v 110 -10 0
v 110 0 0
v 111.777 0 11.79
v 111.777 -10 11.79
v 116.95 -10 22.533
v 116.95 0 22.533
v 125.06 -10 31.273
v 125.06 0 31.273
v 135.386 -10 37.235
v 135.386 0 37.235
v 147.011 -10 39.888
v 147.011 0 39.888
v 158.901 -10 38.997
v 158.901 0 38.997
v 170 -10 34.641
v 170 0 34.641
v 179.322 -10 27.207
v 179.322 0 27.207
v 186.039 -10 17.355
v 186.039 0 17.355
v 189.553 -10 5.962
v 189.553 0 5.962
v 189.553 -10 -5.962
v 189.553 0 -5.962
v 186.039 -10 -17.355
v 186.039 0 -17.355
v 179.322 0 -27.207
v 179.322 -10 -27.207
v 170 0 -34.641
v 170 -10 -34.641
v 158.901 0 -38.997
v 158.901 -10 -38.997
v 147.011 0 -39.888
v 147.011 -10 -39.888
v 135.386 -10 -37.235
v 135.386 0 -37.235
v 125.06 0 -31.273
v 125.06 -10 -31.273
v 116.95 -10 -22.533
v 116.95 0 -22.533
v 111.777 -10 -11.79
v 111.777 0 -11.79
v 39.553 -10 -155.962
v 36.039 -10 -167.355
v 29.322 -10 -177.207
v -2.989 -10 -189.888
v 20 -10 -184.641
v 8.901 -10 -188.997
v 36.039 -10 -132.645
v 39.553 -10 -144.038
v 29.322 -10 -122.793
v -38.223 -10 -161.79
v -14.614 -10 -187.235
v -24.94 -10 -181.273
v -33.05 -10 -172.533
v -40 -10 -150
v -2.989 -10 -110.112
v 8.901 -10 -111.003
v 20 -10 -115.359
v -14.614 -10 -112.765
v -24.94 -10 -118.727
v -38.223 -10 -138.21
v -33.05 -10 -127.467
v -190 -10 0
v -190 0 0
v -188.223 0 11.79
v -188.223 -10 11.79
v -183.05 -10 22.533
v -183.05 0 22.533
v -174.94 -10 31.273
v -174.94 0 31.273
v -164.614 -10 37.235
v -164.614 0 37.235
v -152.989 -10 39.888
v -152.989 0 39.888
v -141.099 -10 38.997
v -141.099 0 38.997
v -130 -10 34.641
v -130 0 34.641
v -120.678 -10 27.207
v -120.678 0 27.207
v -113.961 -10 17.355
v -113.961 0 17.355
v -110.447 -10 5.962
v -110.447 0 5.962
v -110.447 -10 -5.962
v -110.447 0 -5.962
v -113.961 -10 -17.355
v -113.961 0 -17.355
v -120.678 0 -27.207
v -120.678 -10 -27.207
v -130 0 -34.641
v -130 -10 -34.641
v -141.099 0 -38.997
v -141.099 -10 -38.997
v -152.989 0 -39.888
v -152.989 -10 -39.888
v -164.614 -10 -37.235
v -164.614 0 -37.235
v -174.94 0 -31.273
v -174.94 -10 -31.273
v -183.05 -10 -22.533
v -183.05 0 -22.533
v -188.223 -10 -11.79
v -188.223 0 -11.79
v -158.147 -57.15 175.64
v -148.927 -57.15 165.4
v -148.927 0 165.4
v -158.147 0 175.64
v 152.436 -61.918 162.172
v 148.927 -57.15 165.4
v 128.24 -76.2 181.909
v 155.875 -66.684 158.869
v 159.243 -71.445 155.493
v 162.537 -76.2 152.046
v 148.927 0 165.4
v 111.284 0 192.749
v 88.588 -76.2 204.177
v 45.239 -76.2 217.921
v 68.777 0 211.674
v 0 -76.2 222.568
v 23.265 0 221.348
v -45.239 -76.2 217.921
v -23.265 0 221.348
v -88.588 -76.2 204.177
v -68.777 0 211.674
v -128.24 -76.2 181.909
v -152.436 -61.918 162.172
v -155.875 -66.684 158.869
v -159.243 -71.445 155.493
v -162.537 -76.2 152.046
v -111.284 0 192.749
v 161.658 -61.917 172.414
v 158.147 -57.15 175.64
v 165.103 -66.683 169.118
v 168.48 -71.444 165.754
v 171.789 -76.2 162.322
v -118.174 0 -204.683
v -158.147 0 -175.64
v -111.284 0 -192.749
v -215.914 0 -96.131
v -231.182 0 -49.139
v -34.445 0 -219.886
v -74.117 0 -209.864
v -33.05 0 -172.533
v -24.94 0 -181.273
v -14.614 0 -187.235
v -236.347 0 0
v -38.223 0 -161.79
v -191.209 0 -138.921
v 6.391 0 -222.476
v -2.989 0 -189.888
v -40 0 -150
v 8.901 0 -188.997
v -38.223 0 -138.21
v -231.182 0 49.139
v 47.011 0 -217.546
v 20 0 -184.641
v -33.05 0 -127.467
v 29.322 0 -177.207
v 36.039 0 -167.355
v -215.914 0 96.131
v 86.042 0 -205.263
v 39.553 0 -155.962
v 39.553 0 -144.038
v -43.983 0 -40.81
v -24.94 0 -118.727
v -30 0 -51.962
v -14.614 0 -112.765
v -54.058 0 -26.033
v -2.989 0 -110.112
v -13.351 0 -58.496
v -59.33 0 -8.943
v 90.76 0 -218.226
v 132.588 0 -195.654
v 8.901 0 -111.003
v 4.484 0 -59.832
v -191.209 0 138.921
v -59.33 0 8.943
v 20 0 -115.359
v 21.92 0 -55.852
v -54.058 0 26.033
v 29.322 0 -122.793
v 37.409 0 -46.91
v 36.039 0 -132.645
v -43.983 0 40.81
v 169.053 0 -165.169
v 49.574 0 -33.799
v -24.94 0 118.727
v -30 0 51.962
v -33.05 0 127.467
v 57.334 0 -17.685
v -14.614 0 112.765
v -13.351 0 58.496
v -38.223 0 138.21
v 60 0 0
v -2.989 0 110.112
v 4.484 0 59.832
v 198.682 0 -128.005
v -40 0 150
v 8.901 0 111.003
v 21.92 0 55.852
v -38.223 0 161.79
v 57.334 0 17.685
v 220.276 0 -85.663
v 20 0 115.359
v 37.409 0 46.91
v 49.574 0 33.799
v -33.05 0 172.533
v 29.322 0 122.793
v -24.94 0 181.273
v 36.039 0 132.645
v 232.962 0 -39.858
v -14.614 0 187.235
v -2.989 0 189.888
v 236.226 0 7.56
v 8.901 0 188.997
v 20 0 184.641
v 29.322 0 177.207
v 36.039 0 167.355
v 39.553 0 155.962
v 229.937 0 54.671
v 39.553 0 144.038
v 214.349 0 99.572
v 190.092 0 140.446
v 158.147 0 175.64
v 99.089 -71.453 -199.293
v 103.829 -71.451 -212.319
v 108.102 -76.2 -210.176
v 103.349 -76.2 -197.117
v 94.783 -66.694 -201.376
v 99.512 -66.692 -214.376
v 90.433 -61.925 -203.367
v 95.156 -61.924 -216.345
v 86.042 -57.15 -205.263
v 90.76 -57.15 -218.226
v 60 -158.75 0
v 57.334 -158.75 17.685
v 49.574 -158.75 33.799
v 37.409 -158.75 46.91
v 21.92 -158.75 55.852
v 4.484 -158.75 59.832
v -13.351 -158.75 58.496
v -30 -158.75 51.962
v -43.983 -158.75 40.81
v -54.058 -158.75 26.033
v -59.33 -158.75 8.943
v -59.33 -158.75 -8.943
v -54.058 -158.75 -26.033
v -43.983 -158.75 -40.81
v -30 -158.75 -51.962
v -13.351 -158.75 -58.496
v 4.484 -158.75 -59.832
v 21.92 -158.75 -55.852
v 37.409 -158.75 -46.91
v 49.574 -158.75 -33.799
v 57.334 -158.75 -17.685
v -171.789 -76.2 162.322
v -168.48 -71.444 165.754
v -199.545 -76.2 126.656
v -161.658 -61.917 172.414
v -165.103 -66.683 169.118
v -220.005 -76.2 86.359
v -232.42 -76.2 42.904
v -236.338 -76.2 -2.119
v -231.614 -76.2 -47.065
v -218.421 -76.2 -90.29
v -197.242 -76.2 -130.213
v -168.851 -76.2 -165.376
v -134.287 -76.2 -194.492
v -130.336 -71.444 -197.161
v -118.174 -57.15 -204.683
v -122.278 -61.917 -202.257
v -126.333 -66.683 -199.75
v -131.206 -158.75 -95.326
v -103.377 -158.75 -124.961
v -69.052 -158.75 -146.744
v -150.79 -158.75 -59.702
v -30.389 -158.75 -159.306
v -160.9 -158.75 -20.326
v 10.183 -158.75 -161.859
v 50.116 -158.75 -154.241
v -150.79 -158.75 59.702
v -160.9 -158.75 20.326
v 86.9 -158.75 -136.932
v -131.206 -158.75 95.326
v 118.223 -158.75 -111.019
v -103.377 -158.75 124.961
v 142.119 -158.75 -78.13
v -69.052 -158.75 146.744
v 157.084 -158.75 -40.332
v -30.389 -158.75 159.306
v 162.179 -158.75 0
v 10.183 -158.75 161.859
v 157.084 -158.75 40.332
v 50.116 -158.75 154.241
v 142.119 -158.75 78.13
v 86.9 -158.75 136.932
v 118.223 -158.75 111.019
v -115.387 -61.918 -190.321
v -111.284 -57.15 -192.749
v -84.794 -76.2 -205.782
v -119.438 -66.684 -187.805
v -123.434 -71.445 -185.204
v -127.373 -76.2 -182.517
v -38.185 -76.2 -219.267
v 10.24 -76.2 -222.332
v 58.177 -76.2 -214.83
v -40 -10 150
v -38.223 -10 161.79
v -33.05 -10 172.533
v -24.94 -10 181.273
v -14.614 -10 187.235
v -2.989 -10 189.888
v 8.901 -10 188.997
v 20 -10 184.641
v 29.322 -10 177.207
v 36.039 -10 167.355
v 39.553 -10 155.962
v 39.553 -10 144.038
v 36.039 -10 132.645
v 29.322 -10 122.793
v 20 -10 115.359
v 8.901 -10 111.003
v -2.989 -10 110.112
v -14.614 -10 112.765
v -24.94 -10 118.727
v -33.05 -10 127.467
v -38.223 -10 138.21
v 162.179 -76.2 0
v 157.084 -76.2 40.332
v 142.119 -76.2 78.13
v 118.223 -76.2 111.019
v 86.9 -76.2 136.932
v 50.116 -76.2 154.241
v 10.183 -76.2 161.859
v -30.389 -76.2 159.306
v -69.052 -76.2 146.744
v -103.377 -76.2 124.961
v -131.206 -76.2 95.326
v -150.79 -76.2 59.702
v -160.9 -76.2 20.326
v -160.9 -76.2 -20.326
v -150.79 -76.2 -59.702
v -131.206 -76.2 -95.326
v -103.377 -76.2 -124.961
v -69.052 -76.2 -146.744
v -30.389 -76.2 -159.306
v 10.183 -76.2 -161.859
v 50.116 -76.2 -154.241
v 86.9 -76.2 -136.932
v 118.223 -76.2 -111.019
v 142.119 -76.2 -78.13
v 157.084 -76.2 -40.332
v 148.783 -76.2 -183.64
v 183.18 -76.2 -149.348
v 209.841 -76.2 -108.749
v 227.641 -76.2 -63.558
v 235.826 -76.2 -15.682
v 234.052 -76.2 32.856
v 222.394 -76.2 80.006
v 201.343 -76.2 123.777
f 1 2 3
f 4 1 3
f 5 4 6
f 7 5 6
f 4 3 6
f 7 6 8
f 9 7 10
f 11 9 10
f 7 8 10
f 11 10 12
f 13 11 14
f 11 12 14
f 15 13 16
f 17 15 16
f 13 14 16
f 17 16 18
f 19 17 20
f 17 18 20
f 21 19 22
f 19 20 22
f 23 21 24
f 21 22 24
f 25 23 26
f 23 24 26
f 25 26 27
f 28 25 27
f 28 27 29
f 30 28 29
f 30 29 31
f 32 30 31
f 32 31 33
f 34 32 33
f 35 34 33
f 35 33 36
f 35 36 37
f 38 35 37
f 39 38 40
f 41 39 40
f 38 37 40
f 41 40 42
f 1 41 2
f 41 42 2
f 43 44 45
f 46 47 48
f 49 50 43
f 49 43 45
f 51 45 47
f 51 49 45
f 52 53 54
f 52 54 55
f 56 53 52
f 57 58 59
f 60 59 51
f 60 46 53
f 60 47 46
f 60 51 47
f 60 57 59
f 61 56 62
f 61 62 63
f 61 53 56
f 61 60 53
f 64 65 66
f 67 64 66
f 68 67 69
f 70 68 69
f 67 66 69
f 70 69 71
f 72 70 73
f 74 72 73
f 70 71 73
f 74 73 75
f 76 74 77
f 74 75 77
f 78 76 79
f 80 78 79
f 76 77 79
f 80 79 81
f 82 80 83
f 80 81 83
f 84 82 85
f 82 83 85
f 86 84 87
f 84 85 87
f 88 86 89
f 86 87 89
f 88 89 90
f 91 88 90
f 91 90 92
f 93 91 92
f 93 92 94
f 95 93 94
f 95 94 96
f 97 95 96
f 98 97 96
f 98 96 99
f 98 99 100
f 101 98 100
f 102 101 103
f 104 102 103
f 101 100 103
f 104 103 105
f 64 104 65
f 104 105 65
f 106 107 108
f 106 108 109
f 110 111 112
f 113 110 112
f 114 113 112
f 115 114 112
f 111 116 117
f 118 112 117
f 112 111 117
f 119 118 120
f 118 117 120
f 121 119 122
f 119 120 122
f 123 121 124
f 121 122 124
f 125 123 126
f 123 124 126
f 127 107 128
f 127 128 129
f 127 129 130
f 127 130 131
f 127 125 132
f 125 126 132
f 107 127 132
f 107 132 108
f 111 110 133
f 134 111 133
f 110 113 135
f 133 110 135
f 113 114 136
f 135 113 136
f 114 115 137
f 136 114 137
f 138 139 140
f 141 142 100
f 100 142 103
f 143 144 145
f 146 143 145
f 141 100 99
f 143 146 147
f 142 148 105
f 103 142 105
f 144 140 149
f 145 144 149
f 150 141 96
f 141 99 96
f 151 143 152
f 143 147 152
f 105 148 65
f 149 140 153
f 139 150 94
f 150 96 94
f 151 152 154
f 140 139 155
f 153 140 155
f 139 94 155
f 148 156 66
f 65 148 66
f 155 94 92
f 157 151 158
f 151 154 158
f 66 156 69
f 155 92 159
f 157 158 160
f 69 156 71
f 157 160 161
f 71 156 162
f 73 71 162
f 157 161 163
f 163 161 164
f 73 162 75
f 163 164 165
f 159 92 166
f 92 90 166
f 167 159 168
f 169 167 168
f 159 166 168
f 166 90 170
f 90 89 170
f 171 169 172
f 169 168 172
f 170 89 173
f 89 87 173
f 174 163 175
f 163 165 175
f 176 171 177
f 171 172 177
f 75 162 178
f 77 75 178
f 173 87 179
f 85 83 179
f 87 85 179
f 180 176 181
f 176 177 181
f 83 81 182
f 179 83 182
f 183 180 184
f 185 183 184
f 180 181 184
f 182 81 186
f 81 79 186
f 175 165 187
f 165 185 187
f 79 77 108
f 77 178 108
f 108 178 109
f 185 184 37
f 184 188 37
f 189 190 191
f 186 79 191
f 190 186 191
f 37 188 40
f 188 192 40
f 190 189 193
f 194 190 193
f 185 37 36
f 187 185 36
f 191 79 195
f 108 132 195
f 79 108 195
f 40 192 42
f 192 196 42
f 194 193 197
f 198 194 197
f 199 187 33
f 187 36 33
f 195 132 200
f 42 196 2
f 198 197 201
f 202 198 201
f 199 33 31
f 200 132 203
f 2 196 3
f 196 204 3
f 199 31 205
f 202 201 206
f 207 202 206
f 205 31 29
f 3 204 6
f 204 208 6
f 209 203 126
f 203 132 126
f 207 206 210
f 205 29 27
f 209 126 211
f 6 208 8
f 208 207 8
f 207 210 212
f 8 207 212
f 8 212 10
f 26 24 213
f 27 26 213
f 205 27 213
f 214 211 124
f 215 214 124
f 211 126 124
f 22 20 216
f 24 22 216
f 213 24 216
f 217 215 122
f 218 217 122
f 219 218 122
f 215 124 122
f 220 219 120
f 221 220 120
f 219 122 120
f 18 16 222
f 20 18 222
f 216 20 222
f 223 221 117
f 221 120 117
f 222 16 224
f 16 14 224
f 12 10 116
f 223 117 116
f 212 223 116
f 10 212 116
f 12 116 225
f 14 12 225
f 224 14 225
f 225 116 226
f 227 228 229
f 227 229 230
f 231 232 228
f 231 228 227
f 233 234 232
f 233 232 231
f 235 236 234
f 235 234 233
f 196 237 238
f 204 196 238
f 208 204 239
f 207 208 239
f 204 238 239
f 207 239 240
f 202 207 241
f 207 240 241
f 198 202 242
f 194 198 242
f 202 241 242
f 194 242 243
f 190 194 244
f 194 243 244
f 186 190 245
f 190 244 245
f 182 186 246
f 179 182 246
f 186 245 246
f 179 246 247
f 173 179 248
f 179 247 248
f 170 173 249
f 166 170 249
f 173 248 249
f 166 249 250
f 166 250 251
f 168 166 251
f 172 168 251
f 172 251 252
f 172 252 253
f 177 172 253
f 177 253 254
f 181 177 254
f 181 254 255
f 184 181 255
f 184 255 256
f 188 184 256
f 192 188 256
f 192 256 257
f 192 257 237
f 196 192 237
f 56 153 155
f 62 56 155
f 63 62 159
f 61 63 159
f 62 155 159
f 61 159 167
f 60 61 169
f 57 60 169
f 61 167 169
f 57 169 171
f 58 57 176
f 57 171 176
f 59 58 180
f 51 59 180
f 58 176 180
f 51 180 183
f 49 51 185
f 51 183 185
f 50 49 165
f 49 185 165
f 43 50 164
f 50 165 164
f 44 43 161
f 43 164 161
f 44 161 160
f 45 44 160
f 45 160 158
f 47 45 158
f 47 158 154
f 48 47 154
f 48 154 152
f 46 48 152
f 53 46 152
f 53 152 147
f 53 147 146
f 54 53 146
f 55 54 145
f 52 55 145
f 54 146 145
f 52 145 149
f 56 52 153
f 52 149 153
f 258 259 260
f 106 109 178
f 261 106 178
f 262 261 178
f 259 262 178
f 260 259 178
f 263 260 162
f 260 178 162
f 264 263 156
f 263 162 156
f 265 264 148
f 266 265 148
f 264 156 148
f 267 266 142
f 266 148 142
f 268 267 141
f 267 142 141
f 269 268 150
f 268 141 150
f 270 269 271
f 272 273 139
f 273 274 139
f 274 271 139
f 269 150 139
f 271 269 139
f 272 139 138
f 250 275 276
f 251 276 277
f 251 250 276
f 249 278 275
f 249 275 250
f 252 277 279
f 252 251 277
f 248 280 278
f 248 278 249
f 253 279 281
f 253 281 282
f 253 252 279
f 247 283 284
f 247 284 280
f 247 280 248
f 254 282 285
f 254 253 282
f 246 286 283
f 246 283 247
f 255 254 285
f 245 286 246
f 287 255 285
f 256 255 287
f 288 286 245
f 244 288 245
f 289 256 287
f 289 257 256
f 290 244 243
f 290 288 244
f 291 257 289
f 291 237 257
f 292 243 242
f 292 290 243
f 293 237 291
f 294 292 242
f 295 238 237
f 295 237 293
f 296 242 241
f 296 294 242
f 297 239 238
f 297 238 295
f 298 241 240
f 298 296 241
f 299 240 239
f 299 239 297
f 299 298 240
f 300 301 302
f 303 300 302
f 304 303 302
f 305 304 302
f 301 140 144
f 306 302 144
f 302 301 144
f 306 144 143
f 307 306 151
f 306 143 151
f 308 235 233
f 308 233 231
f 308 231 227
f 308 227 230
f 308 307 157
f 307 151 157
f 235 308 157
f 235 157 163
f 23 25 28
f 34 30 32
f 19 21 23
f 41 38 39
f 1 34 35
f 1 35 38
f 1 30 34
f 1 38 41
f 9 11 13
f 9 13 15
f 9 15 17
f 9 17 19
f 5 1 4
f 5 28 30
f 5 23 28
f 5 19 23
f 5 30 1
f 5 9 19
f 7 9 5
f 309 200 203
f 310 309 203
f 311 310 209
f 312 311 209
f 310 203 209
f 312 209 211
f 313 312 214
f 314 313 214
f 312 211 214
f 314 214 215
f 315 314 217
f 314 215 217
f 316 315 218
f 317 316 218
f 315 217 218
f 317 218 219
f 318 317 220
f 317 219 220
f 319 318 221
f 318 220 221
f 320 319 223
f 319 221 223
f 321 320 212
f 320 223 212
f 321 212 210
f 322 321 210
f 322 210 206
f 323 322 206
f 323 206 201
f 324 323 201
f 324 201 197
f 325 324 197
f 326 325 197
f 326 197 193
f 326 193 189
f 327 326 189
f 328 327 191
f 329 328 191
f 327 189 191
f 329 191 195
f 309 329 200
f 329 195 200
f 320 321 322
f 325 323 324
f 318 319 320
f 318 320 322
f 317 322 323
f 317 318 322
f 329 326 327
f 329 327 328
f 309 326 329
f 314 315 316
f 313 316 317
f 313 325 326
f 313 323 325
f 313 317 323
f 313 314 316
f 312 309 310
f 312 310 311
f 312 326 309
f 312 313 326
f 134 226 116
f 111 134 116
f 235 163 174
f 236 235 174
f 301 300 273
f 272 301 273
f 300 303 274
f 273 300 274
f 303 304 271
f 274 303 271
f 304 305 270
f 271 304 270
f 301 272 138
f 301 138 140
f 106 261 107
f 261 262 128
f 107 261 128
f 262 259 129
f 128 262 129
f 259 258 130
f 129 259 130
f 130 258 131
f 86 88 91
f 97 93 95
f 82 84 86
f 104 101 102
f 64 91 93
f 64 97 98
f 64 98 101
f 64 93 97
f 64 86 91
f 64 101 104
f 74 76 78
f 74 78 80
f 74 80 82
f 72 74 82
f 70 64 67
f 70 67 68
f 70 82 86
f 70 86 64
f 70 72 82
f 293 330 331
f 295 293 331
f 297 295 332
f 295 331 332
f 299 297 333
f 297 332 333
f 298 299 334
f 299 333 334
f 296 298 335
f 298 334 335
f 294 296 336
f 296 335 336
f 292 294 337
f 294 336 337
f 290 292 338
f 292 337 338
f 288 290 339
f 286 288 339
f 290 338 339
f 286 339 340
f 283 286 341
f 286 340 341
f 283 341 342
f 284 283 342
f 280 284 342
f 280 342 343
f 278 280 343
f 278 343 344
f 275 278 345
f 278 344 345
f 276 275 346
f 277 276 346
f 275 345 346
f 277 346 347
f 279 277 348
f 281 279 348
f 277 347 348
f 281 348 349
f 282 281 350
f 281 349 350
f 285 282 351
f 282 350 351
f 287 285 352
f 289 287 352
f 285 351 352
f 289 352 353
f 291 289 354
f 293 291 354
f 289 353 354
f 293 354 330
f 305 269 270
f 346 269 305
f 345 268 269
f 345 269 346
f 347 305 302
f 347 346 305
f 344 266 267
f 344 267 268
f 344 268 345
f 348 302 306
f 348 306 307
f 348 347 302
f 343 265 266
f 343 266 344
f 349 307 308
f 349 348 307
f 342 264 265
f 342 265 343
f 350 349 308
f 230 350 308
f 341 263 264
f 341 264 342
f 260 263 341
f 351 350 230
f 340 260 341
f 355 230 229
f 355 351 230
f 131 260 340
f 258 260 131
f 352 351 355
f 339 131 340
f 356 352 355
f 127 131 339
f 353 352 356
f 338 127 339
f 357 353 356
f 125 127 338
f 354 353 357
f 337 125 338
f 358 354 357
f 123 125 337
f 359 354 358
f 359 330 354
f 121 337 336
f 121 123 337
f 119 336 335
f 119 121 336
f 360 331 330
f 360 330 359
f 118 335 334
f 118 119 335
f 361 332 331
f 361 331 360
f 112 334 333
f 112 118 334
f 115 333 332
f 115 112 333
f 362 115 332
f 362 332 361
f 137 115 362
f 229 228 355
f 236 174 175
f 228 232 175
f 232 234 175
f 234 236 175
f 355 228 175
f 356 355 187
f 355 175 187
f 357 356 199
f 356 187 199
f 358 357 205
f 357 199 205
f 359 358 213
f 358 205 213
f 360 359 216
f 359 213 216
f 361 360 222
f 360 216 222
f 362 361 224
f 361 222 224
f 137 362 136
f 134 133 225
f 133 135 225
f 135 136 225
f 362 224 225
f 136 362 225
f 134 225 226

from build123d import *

# Parameters (mm, degrees)
F0_R      = 236.347
F1_DEPTH  = 76.2
F2_R      = 162.179
F3_DEPTH  = 82.55
F5_DEPTH  = 139.7
F6_SIZE   = 19.05
F7_SIZE   = 19.05
F8_SIZE   = 19.05
F9_SIZE   = 19.05
F10_R     = 40
F11_DEPTH = 10
F12_R     = 60
F13_DEPTH = 550


with BuildPart() as f1:
    # F0 (on Front) → F1 (new body)
    with BuildSketch(Plane.XZ):
        Circle(F0_R)
    extrude(amount=F1_DEPTH)

    # F2 (on face) → F3 (join)
    with BuildSketch(Plane.XZ.offset(76.2)):
        Circle(F2_R)
    extrude(amount=F3_DEPTH)

    # F4 (on face) → F5 (cut)
    with BuildSketch(Plane(origin=(0, 0, 0), x_dir=(-1, 0, 0), z_dir=(0, 1, 0))):
        with BuildLine():
            Line((-184.812798, 205.255406), (-148.926726, 165.399886))
            ThreePointArc((-148.926726, 165.399886), (0, 222.5675), (148.926726, 165.399886))
            Line((148.926726, 165.399886), (183.385925, 203.670703))
            Line((183.385925, 203.670703), (0, 288.642466))
            Line((0, 288.642466), (-184.812798, 205.255406))
        make_face()
        with BuildLine():
            Line((138.952692, -240.673122), (111.28375, -192.749109))
            ThreePointArc((111.28375, -192.749109), (14.086917, -222.121253), (-86.041814, -205.263485))
            Line((-86.041814, -205.263485), (-123.598595, -308.449893))
            Line((-123.598595, -308.449893), (23.055677, -307.586295))
            Line((23.055677, -307.586295), (138.952692, -240.673122))
        make_face()
    extrude(amount=-F5_DEPTH, mode=Mode.SUBTRACT)

    # F6
    f6_edges = [f1.edges().sort_by_distance(p)[0] for p in [
        (88.400791, -76.2, -211.744722),
    ]]
    chamfer(f6_edges, length=F6_SIZE)

    # F7
    f7_edges = [f1.edges().sort_by_distance(p)[0] for p in [
        (-114.728625, -76.2, -198.715808),
    ]]
    chamfer(f7_edges, length=F7_SIZE)

    # F8
    f8_edges = [f1.edges().sort_by_distance(p)[0] for p in [
        (153.536869, -76.2, 170.519968),
    ]]
    chamfer(f8_edges, length=F8_SIZE)

    # F9
    f9_edges = [f1.edges().sort_by_distance(p)[0] for p in [
        (-153.536869, -76.2, 170.519968),
    ]]
    chamfer(f9_edges, length=F9_SIZE)

    # F10 (on face) → F11 (cut)
    with BuildSketch(Plane(origin=(0, 0, 0), x_dir=(-1, 0, 0), z_dir=(0, 1, 0))):
        with Locations((0, 150)):
            Circle(F10_R)
        with Locations((-150, 0)):
            Circle(F10_R)
        with Locations((0, -150)):
            Circle(F10_R)
        with Locations((150, 0)):
            Circle(F10_R)
    extrude(amount=-F11_DEPTH, mode=Mode.SUBTRACT)

    # F12 (on face) → F13 (cut)
    with BuildSketch(Plane.XZ.offset(158.75)):
        Circle(F12_R)
    extrude(amount=-F13_DEPTH, mode=Mode.SUBTRACT)


solid = f1.part
